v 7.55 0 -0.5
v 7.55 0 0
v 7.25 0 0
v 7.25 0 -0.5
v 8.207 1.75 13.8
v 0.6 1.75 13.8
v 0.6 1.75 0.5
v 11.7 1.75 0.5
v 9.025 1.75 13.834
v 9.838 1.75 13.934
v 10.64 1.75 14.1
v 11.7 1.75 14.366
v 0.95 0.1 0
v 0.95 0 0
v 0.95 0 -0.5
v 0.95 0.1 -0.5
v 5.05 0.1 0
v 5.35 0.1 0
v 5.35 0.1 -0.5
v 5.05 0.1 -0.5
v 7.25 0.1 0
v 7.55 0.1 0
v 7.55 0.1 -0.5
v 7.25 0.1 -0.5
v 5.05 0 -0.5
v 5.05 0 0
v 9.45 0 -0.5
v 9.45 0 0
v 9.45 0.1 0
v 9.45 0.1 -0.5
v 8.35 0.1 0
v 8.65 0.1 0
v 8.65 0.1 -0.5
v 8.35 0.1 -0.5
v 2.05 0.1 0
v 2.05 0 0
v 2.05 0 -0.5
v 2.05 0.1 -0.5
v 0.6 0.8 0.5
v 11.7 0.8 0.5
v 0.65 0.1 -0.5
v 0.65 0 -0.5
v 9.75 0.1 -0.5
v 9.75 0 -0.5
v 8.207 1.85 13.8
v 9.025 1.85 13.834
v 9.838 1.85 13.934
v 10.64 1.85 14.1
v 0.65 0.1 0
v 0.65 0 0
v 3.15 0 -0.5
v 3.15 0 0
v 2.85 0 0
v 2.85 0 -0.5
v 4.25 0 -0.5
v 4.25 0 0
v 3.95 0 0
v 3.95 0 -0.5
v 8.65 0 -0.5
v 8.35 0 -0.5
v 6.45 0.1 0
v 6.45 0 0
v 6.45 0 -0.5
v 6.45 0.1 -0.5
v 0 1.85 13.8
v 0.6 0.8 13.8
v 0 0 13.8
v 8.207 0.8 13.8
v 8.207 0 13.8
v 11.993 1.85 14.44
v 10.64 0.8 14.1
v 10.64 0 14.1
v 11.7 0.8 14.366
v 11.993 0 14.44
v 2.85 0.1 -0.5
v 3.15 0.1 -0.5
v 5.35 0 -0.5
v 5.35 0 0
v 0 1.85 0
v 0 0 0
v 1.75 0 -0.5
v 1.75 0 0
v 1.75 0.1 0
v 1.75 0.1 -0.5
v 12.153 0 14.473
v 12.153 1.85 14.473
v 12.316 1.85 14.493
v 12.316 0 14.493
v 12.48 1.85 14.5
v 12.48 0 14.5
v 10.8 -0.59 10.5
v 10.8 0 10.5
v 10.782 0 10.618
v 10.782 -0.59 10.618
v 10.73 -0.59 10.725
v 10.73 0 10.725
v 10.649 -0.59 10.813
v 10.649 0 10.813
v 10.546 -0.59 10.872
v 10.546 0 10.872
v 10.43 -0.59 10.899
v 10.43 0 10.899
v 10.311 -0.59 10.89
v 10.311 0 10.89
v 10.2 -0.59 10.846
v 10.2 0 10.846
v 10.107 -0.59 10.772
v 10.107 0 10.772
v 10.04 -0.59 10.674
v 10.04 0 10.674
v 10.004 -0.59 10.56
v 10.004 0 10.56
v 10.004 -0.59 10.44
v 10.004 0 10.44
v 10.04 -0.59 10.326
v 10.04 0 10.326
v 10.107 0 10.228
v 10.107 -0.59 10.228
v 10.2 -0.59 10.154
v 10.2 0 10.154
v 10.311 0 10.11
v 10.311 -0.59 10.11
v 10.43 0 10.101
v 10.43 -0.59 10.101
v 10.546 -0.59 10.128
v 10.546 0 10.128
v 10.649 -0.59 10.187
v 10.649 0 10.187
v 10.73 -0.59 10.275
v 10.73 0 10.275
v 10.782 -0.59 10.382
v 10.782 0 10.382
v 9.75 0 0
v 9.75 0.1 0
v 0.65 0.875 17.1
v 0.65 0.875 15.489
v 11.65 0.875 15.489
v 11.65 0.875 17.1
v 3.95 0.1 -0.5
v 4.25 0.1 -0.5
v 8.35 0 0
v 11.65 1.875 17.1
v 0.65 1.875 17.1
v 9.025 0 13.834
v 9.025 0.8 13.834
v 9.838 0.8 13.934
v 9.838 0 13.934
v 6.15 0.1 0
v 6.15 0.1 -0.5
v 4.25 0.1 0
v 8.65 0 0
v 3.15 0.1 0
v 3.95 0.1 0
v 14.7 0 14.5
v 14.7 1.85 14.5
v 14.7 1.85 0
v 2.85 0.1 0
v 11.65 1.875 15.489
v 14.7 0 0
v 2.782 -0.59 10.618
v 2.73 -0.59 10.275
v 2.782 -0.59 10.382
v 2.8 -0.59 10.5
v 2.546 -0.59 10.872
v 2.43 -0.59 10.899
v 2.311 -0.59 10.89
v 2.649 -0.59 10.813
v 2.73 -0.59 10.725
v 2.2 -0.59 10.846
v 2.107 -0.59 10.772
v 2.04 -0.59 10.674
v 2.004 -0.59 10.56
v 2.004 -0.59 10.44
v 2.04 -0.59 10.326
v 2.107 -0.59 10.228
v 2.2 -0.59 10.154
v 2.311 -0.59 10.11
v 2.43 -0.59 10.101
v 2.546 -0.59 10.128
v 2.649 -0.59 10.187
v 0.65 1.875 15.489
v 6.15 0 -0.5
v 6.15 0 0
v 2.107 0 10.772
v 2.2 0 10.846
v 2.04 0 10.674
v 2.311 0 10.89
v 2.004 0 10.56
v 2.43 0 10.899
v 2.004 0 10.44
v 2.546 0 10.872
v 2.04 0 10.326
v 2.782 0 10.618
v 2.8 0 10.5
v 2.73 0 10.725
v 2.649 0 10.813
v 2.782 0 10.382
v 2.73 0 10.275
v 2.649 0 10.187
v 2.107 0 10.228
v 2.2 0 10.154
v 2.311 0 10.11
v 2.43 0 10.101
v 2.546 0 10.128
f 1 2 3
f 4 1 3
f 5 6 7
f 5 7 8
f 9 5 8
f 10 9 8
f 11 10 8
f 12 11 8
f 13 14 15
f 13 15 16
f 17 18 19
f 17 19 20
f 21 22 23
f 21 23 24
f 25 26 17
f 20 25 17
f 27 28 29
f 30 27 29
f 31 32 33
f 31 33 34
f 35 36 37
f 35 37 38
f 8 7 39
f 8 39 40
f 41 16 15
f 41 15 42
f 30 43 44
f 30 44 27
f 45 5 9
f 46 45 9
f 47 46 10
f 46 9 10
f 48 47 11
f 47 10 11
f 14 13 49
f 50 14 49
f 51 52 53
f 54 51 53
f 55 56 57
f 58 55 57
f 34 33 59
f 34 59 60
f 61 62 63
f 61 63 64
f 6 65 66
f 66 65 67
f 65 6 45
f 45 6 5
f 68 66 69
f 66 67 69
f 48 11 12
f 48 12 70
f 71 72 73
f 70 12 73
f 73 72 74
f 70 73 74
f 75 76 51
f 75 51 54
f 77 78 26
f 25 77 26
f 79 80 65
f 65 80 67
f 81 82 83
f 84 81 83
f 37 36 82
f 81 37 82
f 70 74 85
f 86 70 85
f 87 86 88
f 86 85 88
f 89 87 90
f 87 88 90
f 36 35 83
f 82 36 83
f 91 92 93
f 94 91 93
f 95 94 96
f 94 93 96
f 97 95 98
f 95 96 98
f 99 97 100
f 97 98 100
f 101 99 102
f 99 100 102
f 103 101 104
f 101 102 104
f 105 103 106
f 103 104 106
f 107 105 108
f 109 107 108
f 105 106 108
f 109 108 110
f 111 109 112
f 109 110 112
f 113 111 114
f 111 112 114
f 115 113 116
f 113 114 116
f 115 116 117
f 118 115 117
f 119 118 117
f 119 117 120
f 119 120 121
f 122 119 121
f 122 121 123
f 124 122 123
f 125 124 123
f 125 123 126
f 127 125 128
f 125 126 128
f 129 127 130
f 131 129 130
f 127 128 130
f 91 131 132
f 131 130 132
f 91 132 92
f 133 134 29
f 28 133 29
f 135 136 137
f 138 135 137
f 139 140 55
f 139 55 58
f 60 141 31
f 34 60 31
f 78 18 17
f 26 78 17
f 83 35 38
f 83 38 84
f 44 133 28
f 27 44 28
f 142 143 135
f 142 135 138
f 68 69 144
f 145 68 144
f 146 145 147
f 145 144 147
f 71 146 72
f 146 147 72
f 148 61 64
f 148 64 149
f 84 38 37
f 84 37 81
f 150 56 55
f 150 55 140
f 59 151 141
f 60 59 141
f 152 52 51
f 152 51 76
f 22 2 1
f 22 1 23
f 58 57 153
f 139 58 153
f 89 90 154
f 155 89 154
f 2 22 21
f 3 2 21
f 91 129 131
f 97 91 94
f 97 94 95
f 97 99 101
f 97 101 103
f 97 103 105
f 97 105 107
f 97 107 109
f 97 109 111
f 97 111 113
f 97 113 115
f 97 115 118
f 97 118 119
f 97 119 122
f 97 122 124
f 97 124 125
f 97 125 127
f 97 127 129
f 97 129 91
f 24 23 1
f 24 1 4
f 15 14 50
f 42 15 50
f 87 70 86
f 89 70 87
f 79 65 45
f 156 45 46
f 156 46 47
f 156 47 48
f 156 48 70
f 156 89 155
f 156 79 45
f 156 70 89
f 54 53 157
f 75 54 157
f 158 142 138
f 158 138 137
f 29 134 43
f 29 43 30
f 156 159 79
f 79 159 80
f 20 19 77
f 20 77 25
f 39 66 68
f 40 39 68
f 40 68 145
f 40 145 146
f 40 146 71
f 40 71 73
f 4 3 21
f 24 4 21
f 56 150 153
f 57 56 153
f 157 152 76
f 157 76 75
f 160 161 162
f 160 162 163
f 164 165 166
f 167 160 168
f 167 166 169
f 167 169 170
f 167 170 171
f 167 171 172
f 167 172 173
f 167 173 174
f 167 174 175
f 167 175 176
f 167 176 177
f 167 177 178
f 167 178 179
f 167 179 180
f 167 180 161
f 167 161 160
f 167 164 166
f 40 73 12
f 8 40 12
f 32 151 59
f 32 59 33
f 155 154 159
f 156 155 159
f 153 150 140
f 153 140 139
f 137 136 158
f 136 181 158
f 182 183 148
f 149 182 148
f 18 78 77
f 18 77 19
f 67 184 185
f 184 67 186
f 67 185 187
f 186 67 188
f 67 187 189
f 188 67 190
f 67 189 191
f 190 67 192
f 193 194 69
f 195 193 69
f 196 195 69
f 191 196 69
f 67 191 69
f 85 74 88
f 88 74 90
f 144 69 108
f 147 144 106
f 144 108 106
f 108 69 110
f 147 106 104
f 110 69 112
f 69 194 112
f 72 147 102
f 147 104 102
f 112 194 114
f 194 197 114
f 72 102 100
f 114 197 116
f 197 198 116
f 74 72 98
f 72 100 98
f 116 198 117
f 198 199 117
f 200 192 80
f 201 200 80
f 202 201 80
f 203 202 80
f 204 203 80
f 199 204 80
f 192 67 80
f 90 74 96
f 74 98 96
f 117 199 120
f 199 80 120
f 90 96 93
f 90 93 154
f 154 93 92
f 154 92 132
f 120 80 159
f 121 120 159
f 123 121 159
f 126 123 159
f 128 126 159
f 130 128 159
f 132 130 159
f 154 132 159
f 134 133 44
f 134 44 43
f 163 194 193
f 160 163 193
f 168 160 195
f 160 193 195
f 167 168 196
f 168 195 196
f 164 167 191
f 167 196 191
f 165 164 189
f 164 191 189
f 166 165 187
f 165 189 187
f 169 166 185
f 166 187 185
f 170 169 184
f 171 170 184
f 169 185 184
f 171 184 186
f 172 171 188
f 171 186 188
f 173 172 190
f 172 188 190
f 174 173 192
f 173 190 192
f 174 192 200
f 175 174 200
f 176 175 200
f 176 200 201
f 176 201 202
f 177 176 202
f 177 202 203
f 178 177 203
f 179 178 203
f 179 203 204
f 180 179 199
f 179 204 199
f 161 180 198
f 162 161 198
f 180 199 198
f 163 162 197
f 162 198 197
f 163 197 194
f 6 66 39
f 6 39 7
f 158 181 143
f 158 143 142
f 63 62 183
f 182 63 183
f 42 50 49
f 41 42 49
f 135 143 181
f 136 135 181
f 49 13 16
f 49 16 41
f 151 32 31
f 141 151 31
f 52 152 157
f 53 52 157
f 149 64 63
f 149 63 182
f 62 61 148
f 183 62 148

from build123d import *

# Parameters (mm, degrees)
EXTRUDE_1_DEPTH      = 1.85
SKETCH_2_R           = 0.4
EXTRUDE_2_DEPTH      = 0.59
SKETCH_3_W           = 0.3
SKETCH_3_H           = 0.1
EXTRUDE_3_DEPTH      = 0.5
EXTRUDE_3_2_DEPTH    = 0.5
EXTRUDE_3_3_DEPTH    = 0.5
EXTRUDE_3_4_DEPTH    = 0.5
EXTRUDE_3_5_DEPTH    = 0.5
EXTRUDE_3_6_DEPTH    = 0.5
EXTRUDE_3_7_DEPTH    = 0.5
EXTRUDE_3_8_DEPTH    = 0.5
EXTRUDE_3_9_DEPTH    = 0.5
SKETCH_4_W           = 11.1
SKETCH_4_H           = 0.95
CUT_EXTRUDE_1_DEPTH  = 14
EXTRUDE_START        = -0.575
SKETCH_5_W           = 11
SKETCH_5_H           = 1.611144306
EXTRUDE_4_DEPTH      = 0.6
EXTRUDE_4_DEPTH_BACK = 0.4


with BuildPart() as part:
    # 草图1 → 凸台-拉伸1 (new body)
    with BuildSketch(Plane(origin=(0, 0, 0), x_dir=(1, 0, 0), z_dir=(0, 1, 0))):
        with BuildLine():
            Line((0, -13.8), (8.206702303, -13.8))
            ThreePointArc((8.206702303, -13.8), (9.432369379, -13.875397226), (10.639554075, -14.100451956))
            Line((10.639554075, -14.100451956), (11.992939368, -14.439909609))
            ThreePointArc((11.992939368, -14.439909609), (12.234376307, -14.484920555), (12.479509723, -14.5))
            Line((12.479509723, -14.5), (14.7, -14.5))
            Line((14.7, -14.5), (14.7, 0))
            Line((14.7, 0), (0, 0))
            Line((0, 0), (0, -13.8))
        make_face()
    extrude(amount=EXTRUDE_1_DEPTH)

    # 草图2 → 凸台-拉伸2 (add)
    with BuildSketch(Plane.XZ):
        with Locations((2.4, 10.5)):
            Circle(SKETCH_2_R)
        with Locations((10.4, 10.5)):
            Circle(SKETCH_2_R)
    extrude(amount=EXTRUDE_2_DEPTH)

    # 草图4 → 切除-拉伸1 (cut)
    with BuildSketch(Plane.XY.offset(14.5)):
        with Locations((6.15, 1.275)):
            Rectangle(SKETCH_4_W, SKETCH_4_H)
    extrude(amount=-CUT_EXTRUDE_1_DEPTH, mode=Mode.SUBTRACT)


with BuildPart() as body_2:
    # 草图3 → 凸台-拉伸3 (new body)
    with BuildSketch(Plane(origin=(0, 0, 0), x_dir=(-1, 0, 0), z_dir=(0, 0, -1))):
        with Locations((-9.6, 0.05)):
            Rectangle(SKETCH_3_W, SKETCH_3_H)
    extrude(amount=EXTRUDE_3_DEPTH)


with BuildPart() as body_3:
    # 草图3 → Extrude 3 2 (new body)
    with BuildSketch(Plane(origin=(0, 0, 0), x_dir=(-1, 0, 0), z_dir=(0, 0, -1))):
        with Locations((-8.5, 0.05)):
            Rectangle(SKETCH_3_W, SKETCH_3_H)
    extrude(amount=EXTRUDE_3_2_DEPTH)


with BuildPart() as body_4:
    # 草图3 → Extrude 3 3 (new body)
    with BuildSketch(Plane(origin=(0, 0, 0), x_dir=(-1, 0, 0), z_dir=(0, 0, -1))):
        with Locations((-7.4, 0.05)):
            Rectangle(SKETCH_3_W, SKETCH_3_H)
    extrude(amount=EXTRUDE_3_3_DEPTH)


with BuildPart() as body_5:
    # 草图3 → Extrude 3 4 (new body)
    with BuildSketch(Plane(origin=(0, 0, 0), x_dir=(-1, 0, 0), z_dir=(0, 0, -1))):
        with Locations((-6.3, 0.05)):
            Rectangle(SKETCH_3_W, SKETCH_3_H)
    extrude(amount=EXTRUDE_3_4_DEPTH)


with BuildPart() as body_6:
    # 草图3 → Extrude 3 5 (new body)
    with BuildSketch(Plane(origin=(0, 0, 0), x_dir=(-1, 0, 0), z_dir=(0, 0, -1))):
        with Locations((-5.2, 0.05)):
            Rectangle(SKETCH_3_W, SKETCH_3_H)
    extrude(amount=EXTRUDE_3_5_DEPTH)


with BuildPart() as body_7:
    # 草图3 → Extrude 3 6 (new body)
    with BuildSketch(Plane(origin=(0, 0, 0), x_dir=(-1, 0, 0), z_dir=(0, 0, -1))):
        with Locations((-4.1, 0.05)):
            Rectangle(SKETCH_3_W, SKETCH_3_H)
    extrude(amount=EXTRUDE_3_6_DEPTH)


with BuildPart() as body_8:
    # 草图3 → Extrude 3 7 (new body)
    with BuildSketch(Plane(origin=(0, 0, 0), x_dir=(-1, 0, 0), z_dir=(0, 0, -1))):
        with Locations((-3, 0.05)):
            Rectangle(SKETCH_3_W, SKETCH_3_H)
    extrude(amount=EXTRUDE_3_7_DEPTH)


with BuildPart() as body_9:
    # 草图3 → Extrude 3 8 (new body)
    with BuildSketch(Plane(origin=(0, 0, 0), x_dir=(-1, 0, 0), z_dir=(0, 0, -1))):
        with Locations((-1.9, 0.05)):
            Rectangle(SKETCH_3_W, SKETCH_3_H)
    extrude(amount=EXTRUDE_3_8_DEPTH)


with BuildPart() as body_10:
    # 草图3 → Extrude 3 9 (new body)
    with BuildSketch(Plane(origin=(0, 0, 0), x_dir=(-1, 0, 0), z_dir=(0, 0, -1))):
        with Locations((-0.8, 0.05)):
            Rectangle(SKETCH_3_W, SKETCH_3_H)
    extrude(amount=EXTRUDE_3_9_DEPTH)


with BuildPart() as body_11:
    # 草图5 → 凸台-拉伸4 (new body, two sides)
    with BuildSketch(Plane(origin=(0, 1.85, 0), x_dir=(1, 0, 0), z_dir=(0, 1, 0)).offset(EXTRUDE_START)) as extrude_4_sk:
        with Locations((6.15, -16.294427847)):
            Rectangle(SKETCH_5_W, SKETCH_5_H)
    extrude(amount=EXTRUDE_4_DEPTH)
    extrude(extrude_4_sk.sketch, amount=-EXTRUDE_4_DEPTH_BACK)


solid = Compound([part.part, body_2.part, body_3.part, body_4.part, body_5.part, body_6.part, body_7.part, body_8.part, body_9.part, body_10.part, body_11.part])
